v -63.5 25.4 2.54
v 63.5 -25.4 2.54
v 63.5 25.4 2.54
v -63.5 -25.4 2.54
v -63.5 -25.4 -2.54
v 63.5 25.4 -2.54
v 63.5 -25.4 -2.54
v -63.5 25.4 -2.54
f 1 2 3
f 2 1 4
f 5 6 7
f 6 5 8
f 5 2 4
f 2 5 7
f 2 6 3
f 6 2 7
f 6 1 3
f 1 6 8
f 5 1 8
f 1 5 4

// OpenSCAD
// ========================================
// a 5 by 2 by 0.2 inch plate
// NeuroCAD canonical IR; dimensions are millimetres
// ========================================
$fn = 48;

cube(size=[127, 50.8, 5.08], center=true);
